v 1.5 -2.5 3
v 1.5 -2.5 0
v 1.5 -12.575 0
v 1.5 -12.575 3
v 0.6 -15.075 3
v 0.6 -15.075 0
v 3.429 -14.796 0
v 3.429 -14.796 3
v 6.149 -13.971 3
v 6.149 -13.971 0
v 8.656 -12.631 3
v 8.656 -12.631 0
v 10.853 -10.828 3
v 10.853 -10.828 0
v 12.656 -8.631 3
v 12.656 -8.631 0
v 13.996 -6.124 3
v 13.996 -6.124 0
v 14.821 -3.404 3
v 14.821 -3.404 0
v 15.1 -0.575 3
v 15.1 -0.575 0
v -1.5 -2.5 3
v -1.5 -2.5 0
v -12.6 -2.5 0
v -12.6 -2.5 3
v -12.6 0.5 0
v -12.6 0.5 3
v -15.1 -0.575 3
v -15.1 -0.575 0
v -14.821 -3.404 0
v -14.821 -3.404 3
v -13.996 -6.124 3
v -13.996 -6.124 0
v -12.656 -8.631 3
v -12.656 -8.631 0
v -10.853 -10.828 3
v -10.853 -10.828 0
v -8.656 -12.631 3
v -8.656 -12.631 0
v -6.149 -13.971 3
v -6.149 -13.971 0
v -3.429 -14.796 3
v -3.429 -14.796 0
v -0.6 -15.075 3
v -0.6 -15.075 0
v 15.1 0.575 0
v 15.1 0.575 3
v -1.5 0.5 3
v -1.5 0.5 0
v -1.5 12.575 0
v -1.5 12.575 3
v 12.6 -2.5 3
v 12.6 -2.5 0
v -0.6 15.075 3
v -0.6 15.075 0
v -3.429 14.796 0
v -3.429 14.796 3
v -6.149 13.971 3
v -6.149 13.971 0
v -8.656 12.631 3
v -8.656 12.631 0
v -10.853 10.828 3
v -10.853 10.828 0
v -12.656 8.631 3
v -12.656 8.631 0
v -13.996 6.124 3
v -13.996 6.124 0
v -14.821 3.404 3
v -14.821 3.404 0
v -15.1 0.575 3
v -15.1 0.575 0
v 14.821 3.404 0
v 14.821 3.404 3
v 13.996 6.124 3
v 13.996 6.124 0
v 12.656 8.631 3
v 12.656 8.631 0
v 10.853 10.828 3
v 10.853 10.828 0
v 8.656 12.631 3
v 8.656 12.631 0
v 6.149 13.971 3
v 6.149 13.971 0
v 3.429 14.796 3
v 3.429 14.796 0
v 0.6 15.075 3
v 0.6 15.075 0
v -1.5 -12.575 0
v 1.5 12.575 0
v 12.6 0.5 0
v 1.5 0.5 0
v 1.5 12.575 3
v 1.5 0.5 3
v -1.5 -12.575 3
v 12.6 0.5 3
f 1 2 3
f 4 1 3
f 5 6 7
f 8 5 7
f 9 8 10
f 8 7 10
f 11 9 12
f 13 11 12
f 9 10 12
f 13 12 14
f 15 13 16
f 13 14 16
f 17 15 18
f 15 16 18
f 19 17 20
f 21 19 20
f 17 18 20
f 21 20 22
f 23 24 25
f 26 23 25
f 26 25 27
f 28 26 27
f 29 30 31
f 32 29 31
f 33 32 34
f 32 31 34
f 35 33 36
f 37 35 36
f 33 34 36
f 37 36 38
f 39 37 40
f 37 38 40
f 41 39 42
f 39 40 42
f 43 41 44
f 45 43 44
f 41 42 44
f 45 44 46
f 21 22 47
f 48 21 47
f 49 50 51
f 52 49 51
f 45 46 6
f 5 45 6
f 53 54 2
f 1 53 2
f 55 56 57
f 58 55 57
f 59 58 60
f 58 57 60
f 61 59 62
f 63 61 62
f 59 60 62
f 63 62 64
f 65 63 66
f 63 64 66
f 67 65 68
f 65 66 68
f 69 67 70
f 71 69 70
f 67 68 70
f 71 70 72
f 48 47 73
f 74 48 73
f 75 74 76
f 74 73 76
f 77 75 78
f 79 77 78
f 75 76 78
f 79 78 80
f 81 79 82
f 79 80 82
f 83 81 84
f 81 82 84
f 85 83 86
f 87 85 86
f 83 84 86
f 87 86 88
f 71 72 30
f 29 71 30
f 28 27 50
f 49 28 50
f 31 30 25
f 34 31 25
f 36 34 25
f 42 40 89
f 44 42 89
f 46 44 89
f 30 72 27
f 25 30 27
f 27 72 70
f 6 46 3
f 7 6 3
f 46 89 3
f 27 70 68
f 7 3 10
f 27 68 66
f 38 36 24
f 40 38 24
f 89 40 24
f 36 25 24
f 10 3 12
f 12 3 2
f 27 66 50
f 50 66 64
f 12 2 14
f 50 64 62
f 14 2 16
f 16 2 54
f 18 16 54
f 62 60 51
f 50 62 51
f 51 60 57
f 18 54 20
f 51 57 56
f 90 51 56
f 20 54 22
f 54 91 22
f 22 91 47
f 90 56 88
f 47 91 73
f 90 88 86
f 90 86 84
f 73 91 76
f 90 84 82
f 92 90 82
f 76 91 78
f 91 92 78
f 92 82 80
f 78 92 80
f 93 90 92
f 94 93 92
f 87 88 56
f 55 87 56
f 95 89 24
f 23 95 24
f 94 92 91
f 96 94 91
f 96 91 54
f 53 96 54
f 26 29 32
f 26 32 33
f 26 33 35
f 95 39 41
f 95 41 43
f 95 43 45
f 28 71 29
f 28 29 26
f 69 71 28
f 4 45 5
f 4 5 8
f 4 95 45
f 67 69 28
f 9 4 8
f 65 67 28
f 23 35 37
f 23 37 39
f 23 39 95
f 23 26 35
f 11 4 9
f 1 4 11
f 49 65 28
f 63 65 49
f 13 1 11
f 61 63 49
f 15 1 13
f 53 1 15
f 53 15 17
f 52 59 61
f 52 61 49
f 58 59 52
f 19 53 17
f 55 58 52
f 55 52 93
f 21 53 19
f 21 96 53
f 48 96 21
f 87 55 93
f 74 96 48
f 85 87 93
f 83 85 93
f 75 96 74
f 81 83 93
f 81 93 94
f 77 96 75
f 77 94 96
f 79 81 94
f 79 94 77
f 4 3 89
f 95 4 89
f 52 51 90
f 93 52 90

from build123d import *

# Parameters (mm, degrees)
SALIENTE_EXTRUIR1_DEPTH = 3


with BuildPart() as part:
    # Croquis1 → Saliente-Extruir1 (new body)
    with BuildSketch(Plane.XY):
        with BuildLine():
            Line((-0.6, -15.075), (0.6, -15.075))
            ThreePointArc((0.6, -15.075), (10.853048327, -10.828048327), (15.1, -0.575))
            Line((15.1, -0.575), (15.1, 0.575))
            ThreePointArc((15.1, 0.575), (10.853048327, 10.828048327), (0.6, 15.075))
            Line((0.6, 15.075), (-0.6, 15.075))
            ThreePointArc((-0.6, 15.075), (-10.853048327, 10.828048327), (-15.1, 0.575))
            Line((-15.1, 0.575), (-15.1, -0.575))
            ThreePointArc((-15.1, -0.575), (-10.853048327, -10.828048327), (-0.6, -15.075))
        make_face()
        Polygon((-12.6, -2.5), (-12.6, 0.5), (-1.5, 0.5), (-1.5, 12.575), (1.5, 12.575), (1.5, 0.5), (12.6, 0.5), (12.6, -2.5), (1.5, -2.5), (1.5, -12.575), (-1.5, -12.575), (-1.5, -2.5), align=None, mode=Mode.SUBTRACT)
    extrude(amount=SALIENTE_EXTRUIR1_DEPTH)


solid = part.part
